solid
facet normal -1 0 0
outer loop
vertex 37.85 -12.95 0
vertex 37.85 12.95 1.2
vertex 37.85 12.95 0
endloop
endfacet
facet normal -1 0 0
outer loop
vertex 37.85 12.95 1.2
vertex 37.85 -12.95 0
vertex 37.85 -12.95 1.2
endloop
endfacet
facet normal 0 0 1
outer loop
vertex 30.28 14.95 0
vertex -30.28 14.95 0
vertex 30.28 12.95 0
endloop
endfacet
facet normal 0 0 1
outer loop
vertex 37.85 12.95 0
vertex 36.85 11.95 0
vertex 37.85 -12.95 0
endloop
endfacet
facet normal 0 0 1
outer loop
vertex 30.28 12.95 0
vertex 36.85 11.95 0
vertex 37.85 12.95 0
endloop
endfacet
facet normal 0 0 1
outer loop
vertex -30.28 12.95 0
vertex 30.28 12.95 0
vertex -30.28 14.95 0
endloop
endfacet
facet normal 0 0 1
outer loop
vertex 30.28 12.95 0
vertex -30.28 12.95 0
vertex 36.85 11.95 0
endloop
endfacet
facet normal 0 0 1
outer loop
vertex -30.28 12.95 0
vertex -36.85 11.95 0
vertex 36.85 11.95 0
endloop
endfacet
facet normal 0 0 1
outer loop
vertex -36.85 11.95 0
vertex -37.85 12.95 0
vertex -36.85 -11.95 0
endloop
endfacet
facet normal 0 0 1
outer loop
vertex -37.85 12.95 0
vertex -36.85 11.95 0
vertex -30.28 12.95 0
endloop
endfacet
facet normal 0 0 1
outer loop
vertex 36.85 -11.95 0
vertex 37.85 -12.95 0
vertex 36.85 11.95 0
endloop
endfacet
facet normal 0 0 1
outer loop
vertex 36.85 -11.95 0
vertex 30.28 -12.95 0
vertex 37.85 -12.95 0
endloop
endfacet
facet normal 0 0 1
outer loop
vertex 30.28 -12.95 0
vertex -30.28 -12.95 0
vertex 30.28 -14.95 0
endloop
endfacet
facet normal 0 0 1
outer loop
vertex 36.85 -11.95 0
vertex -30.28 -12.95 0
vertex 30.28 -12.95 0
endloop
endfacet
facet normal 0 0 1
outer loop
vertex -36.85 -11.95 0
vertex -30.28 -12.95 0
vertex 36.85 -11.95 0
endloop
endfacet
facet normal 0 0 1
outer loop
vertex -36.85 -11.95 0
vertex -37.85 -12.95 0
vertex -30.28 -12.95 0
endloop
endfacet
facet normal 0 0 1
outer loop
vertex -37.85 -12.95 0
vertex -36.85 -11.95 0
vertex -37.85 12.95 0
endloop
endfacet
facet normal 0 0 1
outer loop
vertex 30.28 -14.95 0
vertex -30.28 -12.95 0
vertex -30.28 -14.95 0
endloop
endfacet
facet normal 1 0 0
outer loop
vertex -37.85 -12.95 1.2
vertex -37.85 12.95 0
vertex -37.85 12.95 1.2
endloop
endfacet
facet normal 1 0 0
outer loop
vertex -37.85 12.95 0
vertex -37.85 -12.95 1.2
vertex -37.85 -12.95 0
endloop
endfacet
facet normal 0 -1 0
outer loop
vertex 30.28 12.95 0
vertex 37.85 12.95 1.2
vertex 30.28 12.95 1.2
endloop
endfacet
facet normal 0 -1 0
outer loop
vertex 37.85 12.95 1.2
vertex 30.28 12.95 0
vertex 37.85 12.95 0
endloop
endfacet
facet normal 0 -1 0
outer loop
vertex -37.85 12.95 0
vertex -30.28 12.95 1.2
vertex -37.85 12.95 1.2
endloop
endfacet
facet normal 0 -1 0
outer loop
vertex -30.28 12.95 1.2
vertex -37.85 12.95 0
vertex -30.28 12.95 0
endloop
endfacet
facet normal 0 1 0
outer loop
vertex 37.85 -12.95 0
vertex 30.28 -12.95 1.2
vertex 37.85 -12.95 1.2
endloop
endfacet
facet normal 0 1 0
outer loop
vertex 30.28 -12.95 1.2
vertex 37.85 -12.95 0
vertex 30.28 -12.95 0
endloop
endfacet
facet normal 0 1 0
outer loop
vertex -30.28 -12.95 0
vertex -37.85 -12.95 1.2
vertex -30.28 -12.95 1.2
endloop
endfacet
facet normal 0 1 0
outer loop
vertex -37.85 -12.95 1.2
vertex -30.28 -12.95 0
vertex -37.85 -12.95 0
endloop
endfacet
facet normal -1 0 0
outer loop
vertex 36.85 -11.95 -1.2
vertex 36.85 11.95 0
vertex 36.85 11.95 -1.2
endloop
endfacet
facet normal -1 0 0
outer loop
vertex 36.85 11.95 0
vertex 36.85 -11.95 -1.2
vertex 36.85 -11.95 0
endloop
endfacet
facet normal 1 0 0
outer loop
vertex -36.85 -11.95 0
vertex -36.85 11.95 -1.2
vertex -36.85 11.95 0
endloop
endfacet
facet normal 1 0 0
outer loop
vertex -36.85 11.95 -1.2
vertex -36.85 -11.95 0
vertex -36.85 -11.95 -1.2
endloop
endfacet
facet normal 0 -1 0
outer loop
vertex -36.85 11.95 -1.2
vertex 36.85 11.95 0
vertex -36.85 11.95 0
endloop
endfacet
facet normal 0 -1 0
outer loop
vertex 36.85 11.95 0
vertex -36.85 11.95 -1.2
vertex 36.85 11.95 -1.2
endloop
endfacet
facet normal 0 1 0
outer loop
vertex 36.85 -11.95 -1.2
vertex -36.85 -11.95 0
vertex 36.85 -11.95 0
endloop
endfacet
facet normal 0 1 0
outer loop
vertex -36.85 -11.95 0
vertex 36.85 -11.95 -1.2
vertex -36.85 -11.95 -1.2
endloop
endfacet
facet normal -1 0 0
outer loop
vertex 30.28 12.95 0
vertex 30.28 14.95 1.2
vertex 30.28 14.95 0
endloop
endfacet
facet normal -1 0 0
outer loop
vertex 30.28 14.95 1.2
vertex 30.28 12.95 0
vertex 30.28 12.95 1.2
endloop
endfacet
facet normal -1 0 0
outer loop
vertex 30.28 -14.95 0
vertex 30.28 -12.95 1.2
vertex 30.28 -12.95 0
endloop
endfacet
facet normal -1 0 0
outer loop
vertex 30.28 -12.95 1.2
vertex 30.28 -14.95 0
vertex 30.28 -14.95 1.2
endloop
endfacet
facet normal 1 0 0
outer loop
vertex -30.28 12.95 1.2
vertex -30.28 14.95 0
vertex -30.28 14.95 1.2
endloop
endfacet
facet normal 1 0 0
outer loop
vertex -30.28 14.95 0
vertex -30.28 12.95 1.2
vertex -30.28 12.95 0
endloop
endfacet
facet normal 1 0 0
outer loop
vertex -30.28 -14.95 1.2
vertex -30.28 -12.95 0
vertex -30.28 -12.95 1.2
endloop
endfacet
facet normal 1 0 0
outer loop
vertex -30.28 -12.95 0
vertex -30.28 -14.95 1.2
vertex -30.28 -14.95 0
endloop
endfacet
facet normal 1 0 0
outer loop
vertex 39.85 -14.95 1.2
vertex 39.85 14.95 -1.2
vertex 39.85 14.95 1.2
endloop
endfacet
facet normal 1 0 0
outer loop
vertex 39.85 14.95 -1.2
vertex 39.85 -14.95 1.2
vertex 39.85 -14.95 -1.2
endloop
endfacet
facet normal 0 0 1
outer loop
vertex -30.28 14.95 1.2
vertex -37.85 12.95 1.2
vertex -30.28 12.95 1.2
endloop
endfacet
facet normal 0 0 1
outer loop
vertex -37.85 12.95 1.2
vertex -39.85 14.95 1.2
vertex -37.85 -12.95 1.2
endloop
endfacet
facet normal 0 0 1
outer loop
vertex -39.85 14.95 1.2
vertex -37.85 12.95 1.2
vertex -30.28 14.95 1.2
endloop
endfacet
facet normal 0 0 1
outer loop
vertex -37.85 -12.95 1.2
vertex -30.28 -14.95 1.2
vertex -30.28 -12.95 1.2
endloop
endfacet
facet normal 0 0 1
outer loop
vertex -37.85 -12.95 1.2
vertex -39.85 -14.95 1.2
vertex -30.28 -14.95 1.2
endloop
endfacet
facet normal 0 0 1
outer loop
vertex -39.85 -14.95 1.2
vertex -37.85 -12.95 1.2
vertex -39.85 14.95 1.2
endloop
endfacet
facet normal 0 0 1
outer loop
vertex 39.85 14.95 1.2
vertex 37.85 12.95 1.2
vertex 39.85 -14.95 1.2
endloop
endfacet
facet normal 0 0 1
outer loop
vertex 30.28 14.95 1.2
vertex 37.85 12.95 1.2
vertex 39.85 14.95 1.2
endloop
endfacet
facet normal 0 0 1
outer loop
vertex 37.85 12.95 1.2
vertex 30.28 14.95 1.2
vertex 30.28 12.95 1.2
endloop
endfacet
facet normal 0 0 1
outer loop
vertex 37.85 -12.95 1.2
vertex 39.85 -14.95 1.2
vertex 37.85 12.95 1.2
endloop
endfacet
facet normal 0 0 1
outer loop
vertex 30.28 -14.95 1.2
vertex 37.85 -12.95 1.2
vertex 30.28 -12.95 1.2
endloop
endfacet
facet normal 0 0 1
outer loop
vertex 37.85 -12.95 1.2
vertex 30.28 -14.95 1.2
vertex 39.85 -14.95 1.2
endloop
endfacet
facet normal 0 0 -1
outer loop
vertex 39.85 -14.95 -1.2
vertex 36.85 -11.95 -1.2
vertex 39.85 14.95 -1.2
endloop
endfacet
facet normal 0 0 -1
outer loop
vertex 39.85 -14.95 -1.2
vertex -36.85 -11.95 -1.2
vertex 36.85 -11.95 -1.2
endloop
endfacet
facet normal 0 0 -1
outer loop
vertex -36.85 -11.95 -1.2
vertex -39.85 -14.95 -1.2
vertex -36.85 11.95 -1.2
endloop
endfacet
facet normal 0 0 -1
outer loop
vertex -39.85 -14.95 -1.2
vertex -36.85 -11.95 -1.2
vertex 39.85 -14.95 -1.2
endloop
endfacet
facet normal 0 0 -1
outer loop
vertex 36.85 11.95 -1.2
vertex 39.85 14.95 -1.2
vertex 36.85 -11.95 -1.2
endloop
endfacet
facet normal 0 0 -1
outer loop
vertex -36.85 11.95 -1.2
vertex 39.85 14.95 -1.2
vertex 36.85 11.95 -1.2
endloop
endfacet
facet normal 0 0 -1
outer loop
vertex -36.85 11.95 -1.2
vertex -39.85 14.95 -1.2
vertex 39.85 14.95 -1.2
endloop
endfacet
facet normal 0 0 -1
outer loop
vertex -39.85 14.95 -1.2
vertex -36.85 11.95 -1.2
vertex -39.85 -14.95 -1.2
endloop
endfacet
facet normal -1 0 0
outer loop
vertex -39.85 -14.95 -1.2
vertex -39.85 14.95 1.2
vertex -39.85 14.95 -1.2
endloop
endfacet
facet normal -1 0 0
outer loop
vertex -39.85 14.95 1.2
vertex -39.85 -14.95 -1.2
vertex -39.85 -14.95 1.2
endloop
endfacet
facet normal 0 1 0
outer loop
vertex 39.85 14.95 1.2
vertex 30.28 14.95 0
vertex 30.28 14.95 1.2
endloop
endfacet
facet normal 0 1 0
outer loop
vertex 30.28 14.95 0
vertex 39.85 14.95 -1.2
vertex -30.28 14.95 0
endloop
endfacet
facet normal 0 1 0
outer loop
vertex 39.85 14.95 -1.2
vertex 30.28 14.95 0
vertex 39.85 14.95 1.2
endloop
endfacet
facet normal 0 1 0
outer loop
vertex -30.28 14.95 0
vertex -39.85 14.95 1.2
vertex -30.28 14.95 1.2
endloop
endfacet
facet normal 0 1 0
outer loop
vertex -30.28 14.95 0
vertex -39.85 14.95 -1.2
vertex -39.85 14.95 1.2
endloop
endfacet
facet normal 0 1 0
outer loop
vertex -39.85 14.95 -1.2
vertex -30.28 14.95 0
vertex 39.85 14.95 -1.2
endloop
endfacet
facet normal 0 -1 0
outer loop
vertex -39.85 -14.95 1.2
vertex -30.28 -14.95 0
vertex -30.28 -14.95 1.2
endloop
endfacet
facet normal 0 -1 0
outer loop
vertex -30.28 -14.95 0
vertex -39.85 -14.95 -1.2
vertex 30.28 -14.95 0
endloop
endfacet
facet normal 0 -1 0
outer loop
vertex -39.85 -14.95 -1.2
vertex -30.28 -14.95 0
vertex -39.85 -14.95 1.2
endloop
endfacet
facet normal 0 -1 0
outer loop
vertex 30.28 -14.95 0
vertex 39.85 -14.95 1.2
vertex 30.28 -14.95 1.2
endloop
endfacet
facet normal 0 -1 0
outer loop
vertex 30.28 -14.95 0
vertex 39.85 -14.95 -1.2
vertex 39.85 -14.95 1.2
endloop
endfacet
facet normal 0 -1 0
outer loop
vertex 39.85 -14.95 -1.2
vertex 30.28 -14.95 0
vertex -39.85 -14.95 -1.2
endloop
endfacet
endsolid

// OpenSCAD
//models of the glass pieces used to hold samples
// and respective holders

tol = 0.2;
$fn = 30;

wall_t = 2;

//slide 1 ("traditional")
mic_slide_l = 75.7;
mic_slide_w = 25.9;
mic_slide_h = 1.1;


//slide 2 (slide cover)
mc_s = 22;

//slide 3 (slide cover round)
mc_d = 21.7;
mc_h = 0.15;


module mic_slide(){
    difference(){
    cube([mic_slide_l+2*wall_t,mic_slide_w+2*wall_t,mic_slide_h+mic_slide_h+0.2],center=true);
  union(){
    translate([0,0,wall_t/2]){
        cube([mic_slide_l,mic_slide_w,wall_t],center=true);
    }//end translate
    
    translate([0,0,0]){
        cube([mic_slide_l-wall_t,mic_slide_w-wall_t,mic_slide_h+10],center=true);
    }//end translate
    translate([0,0,wall_t/2]){
        cube([mic_slide_l*0.8,mic_slide_w+10,wall_t],center=true);
    }//end translate
}//end union
}//end difference
}//end module

mic_slide();
